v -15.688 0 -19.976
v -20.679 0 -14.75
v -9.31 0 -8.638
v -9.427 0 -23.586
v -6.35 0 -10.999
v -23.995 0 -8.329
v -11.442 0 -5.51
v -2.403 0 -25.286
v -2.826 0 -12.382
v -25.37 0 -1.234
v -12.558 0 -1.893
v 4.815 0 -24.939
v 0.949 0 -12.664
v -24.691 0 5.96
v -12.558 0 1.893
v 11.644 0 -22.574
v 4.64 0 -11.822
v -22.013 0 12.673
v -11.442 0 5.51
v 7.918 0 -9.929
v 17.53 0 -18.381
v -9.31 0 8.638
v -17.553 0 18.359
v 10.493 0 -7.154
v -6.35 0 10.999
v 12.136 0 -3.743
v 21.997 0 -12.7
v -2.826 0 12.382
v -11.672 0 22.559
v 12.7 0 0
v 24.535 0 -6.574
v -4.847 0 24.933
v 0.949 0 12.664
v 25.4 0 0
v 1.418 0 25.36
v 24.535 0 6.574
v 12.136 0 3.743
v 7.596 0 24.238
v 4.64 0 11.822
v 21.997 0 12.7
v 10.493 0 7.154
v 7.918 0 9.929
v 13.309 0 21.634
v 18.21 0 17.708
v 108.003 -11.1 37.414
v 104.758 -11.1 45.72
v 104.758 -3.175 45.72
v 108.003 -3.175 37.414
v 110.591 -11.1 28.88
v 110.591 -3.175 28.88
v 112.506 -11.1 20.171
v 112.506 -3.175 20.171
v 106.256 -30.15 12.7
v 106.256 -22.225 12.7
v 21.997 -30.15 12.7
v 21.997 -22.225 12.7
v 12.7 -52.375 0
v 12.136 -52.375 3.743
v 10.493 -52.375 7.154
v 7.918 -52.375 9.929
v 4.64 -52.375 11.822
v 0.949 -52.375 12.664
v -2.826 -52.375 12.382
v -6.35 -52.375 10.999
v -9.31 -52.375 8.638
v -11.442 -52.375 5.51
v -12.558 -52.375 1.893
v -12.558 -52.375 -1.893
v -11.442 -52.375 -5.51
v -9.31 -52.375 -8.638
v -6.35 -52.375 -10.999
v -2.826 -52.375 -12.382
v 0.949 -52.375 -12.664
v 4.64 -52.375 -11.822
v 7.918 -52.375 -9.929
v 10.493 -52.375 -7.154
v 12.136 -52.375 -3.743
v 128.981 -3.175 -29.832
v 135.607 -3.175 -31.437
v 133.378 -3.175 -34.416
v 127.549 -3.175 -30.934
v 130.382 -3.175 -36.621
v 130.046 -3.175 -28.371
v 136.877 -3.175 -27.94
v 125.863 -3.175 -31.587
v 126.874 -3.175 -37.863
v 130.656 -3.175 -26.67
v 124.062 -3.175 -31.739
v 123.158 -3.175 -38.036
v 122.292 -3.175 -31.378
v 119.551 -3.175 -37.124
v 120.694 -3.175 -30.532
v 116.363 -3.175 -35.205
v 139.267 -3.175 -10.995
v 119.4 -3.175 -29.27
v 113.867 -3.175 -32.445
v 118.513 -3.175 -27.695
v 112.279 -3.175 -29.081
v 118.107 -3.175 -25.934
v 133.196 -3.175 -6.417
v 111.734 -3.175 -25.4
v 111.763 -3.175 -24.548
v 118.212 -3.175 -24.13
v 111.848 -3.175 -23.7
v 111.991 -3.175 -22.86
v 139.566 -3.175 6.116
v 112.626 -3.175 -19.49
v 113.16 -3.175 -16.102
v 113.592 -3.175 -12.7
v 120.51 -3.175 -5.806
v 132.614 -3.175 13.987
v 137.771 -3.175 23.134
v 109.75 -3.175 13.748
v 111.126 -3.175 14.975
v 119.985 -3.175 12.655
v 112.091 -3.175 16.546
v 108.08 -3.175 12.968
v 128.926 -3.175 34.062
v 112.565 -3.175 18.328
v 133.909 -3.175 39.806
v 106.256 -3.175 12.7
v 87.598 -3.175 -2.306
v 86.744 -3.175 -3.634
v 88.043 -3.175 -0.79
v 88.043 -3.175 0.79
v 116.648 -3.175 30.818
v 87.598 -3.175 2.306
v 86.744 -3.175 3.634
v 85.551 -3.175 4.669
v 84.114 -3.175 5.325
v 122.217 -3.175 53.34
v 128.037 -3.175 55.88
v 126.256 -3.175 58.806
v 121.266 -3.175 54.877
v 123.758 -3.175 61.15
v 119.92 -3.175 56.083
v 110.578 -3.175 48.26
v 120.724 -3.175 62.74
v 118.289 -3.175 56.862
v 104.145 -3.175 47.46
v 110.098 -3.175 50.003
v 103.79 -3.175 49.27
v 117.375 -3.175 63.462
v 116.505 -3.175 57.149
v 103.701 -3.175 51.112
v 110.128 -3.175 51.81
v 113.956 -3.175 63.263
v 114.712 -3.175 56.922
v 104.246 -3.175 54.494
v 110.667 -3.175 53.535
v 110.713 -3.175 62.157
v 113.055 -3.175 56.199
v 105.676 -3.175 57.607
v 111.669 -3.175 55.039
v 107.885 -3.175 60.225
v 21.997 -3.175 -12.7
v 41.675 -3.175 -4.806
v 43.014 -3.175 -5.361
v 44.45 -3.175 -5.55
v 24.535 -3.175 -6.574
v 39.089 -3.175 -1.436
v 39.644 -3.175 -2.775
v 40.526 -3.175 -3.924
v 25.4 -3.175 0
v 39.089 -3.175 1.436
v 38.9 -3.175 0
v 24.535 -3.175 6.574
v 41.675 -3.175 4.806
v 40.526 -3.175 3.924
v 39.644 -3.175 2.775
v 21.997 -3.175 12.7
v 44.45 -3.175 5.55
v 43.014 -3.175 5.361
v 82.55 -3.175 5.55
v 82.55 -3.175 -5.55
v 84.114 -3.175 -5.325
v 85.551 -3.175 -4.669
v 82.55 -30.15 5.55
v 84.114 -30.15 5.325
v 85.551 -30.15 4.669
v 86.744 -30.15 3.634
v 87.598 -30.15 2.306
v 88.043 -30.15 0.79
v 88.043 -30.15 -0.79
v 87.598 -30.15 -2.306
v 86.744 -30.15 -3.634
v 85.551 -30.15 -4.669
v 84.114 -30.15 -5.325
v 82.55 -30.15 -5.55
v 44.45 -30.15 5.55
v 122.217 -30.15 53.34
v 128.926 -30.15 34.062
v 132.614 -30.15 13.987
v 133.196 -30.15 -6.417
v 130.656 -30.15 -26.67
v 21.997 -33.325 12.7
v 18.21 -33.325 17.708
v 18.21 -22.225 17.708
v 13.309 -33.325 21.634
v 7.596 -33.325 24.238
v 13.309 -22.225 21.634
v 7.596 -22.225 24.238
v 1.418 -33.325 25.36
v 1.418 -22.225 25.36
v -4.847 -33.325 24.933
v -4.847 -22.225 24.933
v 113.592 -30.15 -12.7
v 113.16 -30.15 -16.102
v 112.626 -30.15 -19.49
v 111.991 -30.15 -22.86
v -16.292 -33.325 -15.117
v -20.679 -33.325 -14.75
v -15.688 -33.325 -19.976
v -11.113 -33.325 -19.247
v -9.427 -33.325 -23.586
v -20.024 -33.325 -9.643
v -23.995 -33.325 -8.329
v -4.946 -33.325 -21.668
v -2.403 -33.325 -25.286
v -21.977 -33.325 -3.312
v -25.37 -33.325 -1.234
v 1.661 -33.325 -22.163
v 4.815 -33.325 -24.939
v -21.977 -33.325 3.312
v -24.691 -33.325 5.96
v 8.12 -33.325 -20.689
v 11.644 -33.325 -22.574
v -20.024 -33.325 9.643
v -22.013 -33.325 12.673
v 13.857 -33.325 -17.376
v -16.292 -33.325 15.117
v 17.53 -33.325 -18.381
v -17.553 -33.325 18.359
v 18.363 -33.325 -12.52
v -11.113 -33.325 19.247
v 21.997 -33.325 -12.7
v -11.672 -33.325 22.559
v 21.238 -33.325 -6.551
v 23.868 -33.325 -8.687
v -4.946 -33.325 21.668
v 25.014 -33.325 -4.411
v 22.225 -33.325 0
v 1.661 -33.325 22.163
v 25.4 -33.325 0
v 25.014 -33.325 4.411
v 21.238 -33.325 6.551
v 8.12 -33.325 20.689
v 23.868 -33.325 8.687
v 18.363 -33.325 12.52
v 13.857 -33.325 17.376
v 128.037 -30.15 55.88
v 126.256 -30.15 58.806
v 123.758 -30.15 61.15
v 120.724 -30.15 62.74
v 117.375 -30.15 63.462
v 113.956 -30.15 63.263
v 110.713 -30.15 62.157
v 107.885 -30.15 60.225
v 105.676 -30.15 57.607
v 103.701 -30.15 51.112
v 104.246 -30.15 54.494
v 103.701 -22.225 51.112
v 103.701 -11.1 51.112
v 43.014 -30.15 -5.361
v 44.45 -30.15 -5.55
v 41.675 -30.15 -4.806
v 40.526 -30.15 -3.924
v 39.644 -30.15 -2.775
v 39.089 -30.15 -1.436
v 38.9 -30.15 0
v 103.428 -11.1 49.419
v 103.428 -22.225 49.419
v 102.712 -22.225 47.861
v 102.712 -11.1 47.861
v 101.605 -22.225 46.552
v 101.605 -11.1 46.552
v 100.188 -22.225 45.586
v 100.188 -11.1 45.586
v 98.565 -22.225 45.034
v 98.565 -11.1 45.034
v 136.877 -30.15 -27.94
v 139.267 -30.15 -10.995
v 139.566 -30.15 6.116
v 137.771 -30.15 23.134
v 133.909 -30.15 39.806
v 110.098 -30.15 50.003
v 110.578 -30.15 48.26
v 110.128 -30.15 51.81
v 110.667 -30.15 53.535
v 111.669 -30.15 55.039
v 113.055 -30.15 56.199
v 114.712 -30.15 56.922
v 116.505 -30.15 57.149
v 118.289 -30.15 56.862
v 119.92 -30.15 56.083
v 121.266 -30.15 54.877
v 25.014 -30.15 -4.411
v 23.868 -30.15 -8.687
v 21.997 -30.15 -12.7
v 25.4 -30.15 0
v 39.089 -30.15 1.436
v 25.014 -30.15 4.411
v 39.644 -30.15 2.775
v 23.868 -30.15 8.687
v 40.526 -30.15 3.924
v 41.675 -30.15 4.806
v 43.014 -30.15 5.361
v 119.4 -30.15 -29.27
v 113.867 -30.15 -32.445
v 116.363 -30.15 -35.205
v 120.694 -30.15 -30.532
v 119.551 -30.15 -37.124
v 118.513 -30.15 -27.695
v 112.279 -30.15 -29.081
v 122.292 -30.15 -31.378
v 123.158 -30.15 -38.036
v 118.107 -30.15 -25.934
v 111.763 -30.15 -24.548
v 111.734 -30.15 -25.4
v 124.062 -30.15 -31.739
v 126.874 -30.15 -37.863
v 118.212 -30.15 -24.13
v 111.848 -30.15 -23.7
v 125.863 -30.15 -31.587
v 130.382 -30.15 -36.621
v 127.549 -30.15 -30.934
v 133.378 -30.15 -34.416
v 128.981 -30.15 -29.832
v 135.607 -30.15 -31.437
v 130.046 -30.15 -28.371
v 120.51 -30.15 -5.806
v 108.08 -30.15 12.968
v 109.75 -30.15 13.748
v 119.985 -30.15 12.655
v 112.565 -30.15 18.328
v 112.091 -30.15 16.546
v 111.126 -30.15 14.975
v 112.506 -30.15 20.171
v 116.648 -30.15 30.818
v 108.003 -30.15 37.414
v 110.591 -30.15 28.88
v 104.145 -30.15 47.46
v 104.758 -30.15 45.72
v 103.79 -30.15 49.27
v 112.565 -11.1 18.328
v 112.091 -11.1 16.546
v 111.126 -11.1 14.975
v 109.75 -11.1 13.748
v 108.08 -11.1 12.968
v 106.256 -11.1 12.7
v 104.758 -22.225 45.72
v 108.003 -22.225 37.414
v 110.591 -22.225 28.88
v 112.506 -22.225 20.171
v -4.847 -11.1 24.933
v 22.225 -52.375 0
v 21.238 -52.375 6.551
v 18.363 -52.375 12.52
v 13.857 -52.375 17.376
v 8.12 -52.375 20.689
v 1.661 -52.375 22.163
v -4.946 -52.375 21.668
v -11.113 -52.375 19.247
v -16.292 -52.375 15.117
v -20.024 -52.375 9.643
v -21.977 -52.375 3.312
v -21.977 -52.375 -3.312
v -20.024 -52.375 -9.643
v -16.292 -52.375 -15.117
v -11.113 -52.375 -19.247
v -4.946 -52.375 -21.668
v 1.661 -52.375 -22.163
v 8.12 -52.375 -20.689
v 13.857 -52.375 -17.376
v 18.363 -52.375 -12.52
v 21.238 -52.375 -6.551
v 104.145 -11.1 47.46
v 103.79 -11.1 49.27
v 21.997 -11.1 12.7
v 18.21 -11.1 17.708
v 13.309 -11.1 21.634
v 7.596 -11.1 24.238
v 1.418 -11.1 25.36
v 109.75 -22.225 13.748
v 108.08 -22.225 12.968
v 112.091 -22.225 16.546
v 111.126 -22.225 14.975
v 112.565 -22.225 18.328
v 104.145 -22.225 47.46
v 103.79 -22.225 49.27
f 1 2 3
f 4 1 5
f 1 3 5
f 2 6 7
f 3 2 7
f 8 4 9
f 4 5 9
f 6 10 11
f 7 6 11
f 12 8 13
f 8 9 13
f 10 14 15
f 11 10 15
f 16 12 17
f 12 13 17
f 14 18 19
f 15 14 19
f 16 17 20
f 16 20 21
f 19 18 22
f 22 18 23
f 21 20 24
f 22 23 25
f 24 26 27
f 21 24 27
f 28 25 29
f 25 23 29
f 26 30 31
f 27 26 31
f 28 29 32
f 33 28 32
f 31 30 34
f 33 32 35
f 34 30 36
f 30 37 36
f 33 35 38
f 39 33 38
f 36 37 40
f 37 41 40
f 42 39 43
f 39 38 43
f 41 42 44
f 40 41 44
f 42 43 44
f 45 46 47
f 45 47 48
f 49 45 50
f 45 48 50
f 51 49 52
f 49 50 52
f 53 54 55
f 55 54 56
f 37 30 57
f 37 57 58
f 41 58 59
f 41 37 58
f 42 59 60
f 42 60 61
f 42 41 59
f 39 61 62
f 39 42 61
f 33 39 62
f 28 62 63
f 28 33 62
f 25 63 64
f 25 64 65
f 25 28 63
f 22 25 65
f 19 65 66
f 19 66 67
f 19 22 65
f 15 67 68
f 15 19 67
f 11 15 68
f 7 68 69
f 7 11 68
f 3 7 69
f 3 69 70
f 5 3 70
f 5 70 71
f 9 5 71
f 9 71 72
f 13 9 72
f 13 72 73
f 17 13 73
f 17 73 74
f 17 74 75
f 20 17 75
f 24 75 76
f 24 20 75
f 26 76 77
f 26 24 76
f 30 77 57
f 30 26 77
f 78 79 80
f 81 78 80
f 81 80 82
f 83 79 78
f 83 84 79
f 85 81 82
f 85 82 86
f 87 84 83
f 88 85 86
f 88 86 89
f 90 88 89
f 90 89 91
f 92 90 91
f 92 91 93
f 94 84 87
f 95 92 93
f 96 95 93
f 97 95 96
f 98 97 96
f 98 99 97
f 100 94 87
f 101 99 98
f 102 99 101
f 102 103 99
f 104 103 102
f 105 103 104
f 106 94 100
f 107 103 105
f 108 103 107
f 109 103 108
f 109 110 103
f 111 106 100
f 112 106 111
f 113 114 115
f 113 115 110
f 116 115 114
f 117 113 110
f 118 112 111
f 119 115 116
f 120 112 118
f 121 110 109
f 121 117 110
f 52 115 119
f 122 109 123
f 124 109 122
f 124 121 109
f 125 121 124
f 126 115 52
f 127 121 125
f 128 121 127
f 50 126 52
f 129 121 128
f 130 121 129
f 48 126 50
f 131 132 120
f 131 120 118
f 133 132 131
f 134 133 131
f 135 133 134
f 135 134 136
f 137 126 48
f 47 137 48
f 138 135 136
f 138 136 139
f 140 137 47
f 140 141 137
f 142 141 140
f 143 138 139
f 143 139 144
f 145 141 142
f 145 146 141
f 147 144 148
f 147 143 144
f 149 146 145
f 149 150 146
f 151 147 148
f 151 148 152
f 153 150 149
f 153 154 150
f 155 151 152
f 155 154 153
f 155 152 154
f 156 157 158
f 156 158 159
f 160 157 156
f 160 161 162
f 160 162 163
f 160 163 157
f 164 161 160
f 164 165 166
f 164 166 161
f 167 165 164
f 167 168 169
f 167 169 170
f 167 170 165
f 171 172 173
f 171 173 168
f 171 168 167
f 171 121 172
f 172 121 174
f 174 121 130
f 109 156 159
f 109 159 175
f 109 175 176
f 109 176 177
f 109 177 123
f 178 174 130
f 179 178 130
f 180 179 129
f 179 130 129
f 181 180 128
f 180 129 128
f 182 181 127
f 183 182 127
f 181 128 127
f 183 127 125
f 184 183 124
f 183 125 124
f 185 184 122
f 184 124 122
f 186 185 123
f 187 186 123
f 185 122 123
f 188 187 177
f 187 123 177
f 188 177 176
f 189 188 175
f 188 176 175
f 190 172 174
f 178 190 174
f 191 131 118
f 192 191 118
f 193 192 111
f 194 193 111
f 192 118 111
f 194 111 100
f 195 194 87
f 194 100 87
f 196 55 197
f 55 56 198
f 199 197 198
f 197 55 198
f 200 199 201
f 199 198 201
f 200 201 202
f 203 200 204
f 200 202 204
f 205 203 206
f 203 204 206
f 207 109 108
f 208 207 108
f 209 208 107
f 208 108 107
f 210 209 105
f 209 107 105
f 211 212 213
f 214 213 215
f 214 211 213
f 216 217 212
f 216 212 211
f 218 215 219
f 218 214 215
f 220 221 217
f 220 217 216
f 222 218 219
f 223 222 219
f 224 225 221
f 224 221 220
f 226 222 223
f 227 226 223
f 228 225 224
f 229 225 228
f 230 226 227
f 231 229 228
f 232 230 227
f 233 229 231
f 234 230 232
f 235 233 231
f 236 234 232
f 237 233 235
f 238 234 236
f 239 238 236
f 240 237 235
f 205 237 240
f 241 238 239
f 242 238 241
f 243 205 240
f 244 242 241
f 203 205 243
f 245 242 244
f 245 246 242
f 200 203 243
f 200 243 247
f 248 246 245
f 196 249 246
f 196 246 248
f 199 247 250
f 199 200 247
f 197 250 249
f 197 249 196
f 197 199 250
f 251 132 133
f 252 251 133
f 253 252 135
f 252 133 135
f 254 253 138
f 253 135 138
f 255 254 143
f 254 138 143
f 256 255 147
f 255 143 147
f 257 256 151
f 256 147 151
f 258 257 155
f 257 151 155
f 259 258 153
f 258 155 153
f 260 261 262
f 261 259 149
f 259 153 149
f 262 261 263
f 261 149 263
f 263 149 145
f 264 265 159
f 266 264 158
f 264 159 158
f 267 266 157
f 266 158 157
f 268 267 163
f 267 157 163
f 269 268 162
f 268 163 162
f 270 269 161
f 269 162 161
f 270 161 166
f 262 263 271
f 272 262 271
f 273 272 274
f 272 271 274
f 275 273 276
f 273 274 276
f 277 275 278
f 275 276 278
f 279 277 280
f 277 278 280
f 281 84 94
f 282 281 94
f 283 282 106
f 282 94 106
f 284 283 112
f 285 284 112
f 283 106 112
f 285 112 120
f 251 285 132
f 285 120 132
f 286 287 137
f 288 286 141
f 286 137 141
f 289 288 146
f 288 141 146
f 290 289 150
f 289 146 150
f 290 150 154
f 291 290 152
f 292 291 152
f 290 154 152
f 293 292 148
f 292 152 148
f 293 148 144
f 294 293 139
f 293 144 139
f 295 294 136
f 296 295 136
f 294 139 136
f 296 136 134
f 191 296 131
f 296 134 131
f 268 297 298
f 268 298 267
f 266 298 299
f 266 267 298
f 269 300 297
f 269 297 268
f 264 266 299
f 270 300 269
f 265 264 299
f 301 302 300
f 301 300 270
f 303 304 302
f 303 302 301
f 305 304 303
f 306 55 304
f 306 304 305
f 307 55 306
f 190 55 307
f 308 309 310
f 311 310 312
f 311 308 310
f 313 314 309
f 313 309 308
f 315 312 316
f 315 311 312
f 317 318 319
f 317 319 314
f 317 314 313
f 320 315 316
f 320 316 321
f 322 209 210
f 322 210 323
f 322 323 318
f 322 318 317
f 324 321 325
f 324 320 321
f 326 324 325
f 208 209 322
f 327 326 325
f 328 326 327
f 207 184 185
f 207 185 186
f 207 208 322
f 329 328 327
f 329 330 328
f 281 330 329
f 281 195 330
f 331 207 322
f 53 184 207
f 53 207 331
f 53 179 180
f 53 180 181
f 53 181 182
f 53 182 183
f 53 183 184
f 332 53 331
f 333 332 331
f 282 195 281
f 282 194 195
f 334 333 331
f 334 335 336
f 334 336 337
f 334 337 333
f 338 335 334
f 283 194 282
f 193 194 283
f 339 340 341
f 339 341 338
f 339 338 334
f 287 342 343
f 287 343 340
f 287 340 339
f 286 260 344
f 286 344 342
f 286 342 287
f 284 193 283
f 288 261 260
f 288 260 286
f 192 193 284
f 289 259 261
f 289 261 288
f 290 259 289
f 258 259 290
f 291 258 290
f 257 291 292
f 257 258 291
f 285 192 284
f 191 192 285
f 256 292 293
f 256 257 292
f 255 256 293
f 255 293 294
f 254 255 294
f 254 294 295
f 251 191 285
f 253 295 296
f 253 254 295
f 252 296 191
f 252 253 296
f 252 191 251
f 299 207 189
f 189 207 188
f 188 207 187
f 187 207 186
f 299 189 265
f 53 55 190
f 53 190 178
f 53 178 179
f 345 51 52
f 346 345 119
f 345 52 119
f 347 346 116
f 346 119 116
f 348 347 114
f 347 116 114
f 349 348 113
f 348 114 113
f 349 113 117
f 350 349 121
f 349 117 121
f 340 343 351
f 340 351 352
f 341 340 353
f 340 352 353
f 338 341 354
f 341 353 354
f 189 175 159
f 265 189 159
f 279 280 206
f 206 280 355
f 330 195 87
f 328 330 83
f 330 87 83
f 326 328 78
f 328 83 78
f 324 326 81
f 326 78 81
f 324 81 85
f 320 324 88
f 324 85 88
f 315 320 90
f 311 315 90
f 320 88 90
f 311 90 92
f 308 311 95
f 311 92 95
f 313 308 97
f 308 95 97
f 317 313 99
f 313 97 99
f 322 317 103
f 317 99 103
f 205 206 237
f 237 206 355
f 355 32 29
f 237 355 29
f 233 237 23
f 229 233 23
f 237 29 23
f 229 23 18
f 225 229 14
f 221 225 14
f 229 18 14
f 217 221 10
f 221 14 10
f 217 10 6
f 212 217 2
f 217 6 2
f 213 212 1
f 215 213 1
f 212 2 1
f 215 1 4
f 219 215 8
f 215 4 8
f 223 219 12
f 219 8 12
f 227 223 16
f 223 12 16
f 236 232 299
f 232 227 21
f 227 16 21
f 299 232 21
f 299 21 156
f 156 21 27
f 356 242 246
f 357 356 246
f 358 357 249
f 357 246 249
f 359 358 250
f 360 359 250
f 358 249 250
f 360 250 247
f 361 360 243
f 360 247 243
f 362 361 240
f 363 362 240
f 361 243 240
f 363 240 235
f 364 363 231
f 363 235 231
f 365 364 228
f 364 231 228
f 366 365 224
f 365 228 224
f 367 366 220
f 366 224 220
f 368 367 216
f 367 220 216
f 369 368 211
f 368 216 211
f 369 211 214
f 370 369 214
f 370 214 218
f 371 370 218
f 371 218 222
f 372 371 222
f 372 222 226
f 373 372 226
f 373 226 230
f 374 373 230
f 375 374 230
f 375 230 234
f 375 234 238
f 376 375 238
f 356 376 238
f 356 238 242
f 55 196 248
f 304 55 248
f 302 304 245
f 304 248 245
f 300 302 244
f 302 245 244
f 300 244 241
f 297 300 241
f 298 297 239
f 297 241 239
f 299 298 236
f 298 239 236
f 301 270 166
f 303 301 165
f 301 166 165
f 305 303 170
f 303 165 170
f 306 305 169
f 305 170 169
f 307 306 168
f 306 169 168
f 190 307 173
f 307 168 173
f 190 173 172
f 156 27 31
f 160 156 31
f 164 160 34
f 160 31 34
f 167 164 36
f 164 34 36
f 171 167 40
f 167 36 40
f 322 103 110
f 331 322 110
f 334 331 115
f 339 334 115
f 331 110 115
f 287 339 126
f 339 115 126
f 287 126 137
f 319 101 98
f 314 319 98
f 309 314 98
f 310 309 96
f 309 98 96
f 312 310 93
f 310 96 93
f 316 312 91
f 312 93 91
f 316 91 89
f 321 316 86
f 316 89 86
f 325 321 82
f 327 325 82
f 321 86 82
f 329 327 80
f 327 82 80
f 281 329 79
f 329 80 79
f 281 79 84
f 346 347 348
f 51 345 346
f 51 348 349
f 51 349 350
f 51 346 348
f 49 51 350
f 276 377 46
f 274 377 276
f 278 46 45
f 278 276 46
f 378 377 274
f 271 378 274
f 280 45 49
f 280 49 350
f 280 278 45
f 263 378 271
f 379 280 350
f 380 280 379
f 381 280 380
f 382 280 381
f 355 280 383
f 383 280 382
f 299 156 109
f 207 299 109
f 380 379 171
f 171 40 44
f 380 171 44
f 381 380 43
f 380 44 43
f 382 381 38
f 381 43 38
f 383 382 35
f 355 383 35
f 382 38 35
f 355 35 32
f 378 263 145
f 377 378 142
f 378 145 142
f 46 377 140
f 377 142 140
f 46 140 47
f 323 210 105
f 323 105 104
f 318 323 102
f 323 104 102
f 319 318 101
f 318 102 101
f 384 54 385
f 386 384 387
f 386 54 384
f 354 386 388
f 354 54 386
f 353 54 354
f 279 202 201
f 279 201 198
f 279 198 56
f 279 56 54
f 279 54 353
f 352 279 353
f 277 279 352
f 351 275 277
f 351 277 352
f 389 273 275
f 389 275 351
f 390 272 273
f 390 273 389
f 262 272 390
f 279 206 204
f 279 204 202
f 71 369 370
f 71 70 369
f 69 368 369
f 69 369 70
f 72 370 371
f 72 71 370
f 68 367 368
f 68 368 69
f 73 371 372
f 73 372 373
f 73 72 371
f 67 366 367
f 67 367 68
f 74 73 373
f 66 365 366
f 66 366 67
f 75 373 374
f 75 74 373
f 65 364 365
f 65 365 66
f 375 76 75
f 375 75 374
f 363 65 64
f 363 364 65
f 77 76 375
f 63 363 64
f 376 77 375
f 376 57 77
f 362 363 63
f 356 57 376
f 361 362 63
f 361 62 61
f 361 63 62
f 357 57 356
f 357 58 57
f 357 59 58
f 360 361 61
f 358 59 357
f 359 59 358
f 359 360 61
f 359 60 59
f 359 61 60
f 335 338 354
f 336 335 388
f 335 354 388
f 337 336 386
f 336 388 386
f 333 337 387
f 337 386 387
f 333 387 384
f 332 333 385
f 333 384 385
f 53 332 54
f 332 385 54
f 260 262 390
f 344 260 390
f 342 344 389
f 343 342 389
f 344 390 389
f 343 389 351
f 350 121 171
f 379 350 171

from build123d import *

# Parameters (mm, degrees)
F0_R     = 22.225
F1_DEPTH = 33.3248
F0_R_2   = 12.7
F2_DEPTH = 52.3748
F4_DEPTH = 3.175
F6_DEPTH = 3.175
F7_DEPTH = 22.225
F9_DEPTH = 11.0998


with BuildPart() as f1:
    # F0 (on Front) → F1 (new body)
    with BuildSketch(Plane.XZ):
        with BuildLine():
            ThreePointArc((21.9970452561, -12.7), (24.5345159877, -6.5740037456), (25.4, 0))
            ThreePointArc((25.4, 0), (24.5345159877, 6.5740037456), (21.9970452561, 12.7))
            ThreePointArc((21.9970452561, 12.7), (10.5332083635, 23.1130162803), (-4.8465484826, 24.9333304596))
            ThreePointArc((-4.8465484826, 24.9333304596), (-20.6785341663, -14.7498550751), (21.9970452561, -12.7))
        make_face()
        Circle(F0_R, mode=Mode.SUBTRACT)
        with BuildLine():
            ThreePointArc((21.9970452561, 12.7), (24.5345159877, 6.5740037456), (25.4, 0))
            ThreePointArc((25.4, 0), (24.5345159877, -6.5740037456), (21.9970452561, -12.7))
            Line((21.9970452561, -12.7), (44.45, -12.7))
            Line((44.45, -12.7), (113.592253257, -12.7))
            ThreePointArc((113.592253257, -12.7), (114.2376587708, 3.7745620369), (112.506165921, 20.1705882353))
            ThreePointArc((112.506165921, 20.1705882353), (111.126051049, 14.9752751807), (106.2558233698, 12.7))
            Line((106.2558233698, 12.7), (44.45, 12.7))
            Line((44.45, 12.7), (21.9970452561, 12.7))
        make_face()
        with BuildLine():
            ThreePointArc((44.45, -5.5499), (40.5256280751, -3.9243719249), (38.9001, 0))
            ThreePointArc((38.9001, 0), (40.5256280751, 3.9243719249), (44.45, 5.5499))
            Line((44.45, 5.5499), (82.55, 5.5499))
            ThreePointArc((82.55, 5.5499), (88.0999, 0), (82.55, -5.5499))
            Line((82.55, -5.5499), (44.45, -5.5499))
        make_face(mode=Mode.SUBTRACT)
        with BuildLine():
            ThreePointArc((112.506165921, 20.1705882353), (114.2376587708, 3.7745620369), (113.592253257, -12.7))
            ThreePointArc((113.592253257, -12.7), (112.9058029226, -17.7980242274), (111.99067104, -22.86))
            ThreePointArc((111.99067104, -22.86), (111.7983897902, -24.1235361825), (111.7340789334, -25.4))
            ThreePointArc((111.7340789334, -25.4), (123.1576151159, -38.0356891432), (136.8774868267, -27.94))
            ThreePointArc((136.8774868267, -27.94), (138.9294471202, 14.6526012321), (128.0371649171, 55.88))
            ThreePointArc((128.0371649171, 55.88), (113.9555393972, 63.2630335862), (103.7012522936, 51.1118625227))
            ThreePointArc((103.7012522936, 51.1118625227), (103.9343890657, 48.3581167453), (104.7576803867, 45.72))
            ThreePointArc((104.7576803867, 45.72), (109.380472839, 33.1723101625), (112.506165921, 20.1705882353))
        make_face()
        with BuildLine():
            ThreePointArc((130.6557828801, -26.67), (123.1640789334, -31.6217039467), (118.2123749867, -24.13))
            ThreePointArc((118.2123749867, -24.13), (119.9845225129, 12.6545192459), (110.5775515193, 48.26))
            ThreePointArc((110.5775515193, 48.26), (113.8574226519, 56.6198711326), (122.2172937845, 53.34))
            ThreePointArc((122.2172937845, 53.34), (132.6144722511, 13.9865739034), (130.6557828801, -26.67))
        make_face(mode=Mode.SUBTRACT)
    extrude(amount=F1_DEPTH)

    # F0 (on Front) → F2 (join)
    with BuildSketch(Plane.XZ):
        Circle(F0_R)
        Circle(F0_R_2, mode=Mode.SUBTRACT)
    extrude(amount=F2_DEPTH)

    # F3 (on face) → F4 (cut)
    with BuildSketch(Plane.XZ.offset(33.3248)):
        with BuildLine():
            ThreePointArc((21.9970452561, 12.7), (24.5345159877, 6.5740037456), (25.4, 0))
            ThreePointArc((25.4, 0), (24.5345159877, -6.5740037456), (21.9970452561, -12.7))
            Line((21.9970452561, -12.7), (113.592253257, -12.7))
            ThreePointArc((113.592253257, -12.7), (112.9058029226, -17.7980242274), (111.99067104, -22.86))
            ThreePointArc((111.99067104, -22.86), (121.8940789334, -37.8434078933), (136.8774868267, -27.94))
            ThreePointArc((136.8774868267, -27.94), (138.9294471202, 14.6526012321), (128.0371649171, 55.88))
            ThreePointArc((128.0371649171, 55.88), (111.3174226519, 62.4397422652), (104.7576803867, 45.72))
            ThreePointArc((104.7576803867, 45.72), (109.380472839, 33.1723101625), (112.506165921, 20.1705882353))
            ThreePointArc((112.506165921, 20.1705882353), (111.126051049, 14.9752751807), (106.2558233698, 12.7))
            Line((106.2558233698, 12.7), (21.9970452561, 12.7))
        make_face()
        with BuildLine():
            Line((82.55, -5.5499), (44.45, -5.5499))
            ThreePointArc((44.45, -5.5499), (38.9001, 0), (44.45, 5.5499))
            Line((44.45, 5.5499), (82.55, 5.5499))
            ThreePointArc((82.55, 5.5499), (88.0999, 0), (82.55, -5.5499))
        make_face(mode=Mode.SUBTRACT)
        with BuildLine():
            ThreePointArc((130.6557828801, -26.67), (123.1640789334, -31.6217039467), (118.2123749867, -24.13))
            ThreePointArc((118.2123749867, -24.13), (119.9845225129, 12.6545192459), (110.5775515193, 48.26))
            ThreePointArc((110.5775515193, 48.26), (113.8574226519, 56.6198711326), (122.2172937845, 53.34))
            ThreePointArc((122.2172937845, 53.34), (132.6144722511, 13.9865739034), (130.6557828801, -26.67))
        make_face(mode=Mode.SUBTRACT)
    extrude(amount=-F4_DEPTH, mode=Mode.SUBTRACT)

    # F5 (on face) → F6 (cut)
    with BuildSketch(Plane(origin=(0, 0, 0), x_dir=(-1, 0, 0), z_dir=(0, 1, 0))):
        with BuildLine():
            ThreePointArc((-21.9970452561, -12.7), (-25.4, 0), (-21.9970452561, 12.7))
            Line((-21.9970452561, 12.7), (-106.2558233698, 12.7))
            ThreePointArc((-106.2558233698, 12.7), (-111.126051049, 14.9752751807), (-112.506165921, 20.1705882353))
            ThreePointArc((-112.506165921, 20.1705882353), (-109.380472839, 33.1723101625), (-104.7576803867, 45.72))
            ThreePointArc((-104.7576803867, 45.72), (-111.3174226519, 62.4397422652), (-128.0371649171, 55.88))
            ThreePointArc((-128.0371649171, 55.88), (-138.9294471202, 14.6526012321), (-136.8774868267, -27.94))
            ThreePointArc((-136.8774868267, -27.94), (-121.8940789334, -37.8434078933), (-111.99067104, -22.86))
            ThreePointArc((-111.99067104, -22.86), (-112.9058029226, -17.7980242274), (-113.592253257, -12.7))
            Line((-113.592253257, -12.7), (-21.9970452561, -12.7))
        make_face()
        with BuildLine():
            ThreePointArc((-122.2172937845, 53.34), (-113.8574226519, 56.6198711326), (-110.5775515193, 48.26))
            ThreePointArc((-110.5775515193, 48.26), (-119.9845225129, 12.6545192459), (-118.2123749867, -24.13))
            ThreePointArc((-118.2123749867, -24.13), (-123.1640789334, -31.6217039467), (-130.6557828801, -26.67))
            ThreePointArc((-130.6557828801, -26.67), (-132.6144722511, 13.9865739034), (-122.2172937845, 53.34))
        make_face(mode=Mode.SUBTRACT)
        with BuildLine():
            Line((-82.55, 5.5499), (-44.45, 5.5499))
            ThreePointArc((-44.45, 5.5499), (-38.9001, 0), (-44.45, -5.5499))
            Line((-44.45, -5.5499), (-82.55, -5.5499))
            ThreePointArc((-82.55, -5.5499), (-88.0999, 0), (-82.55, 5.5499))
        make_face(mode=Mode.SUBTRACT)
    extrude(amount=-F6_DEPTH, mode=Mode.SUBTRACT)

    # F0 (on Front) → F7 (join)
    with BuildSketch(Plane.XZ):
        with BuildLine():
            ThreePointArc((-4.8465484826, 24.9333304596), (10.5332083635, 23.1130162803), (21.9970452561, 12.7))
            Line((21.9970452561, 12.7), (44.45, 12.7))
            Line((44.45, 12.7), (106.2558233698, 12.7))
            ThreePointArc((106.2558233698, 12.7), (111.126051049, 14.9752751807), (112.506165921, 20.1705882353))
            ThreePointArc((112.506165921, 20.1705882353), (109.380472839, 33.1723101625), (104.7576803867, 45.72))
            ThreePointArc((104.7576803867, 45.72), (103.9343890657, 48.3581167453), (103.7012522936, 51.1118625227))
            ThreePointArc((103.7012522936, 51.1118625227), (102.2030178457, 47.1688368577), (98.5648042351, 45.0344611692))
            Line((98.5648042351, 45.0344611692), (-4.8465484826, 24.9333304596))
        make_face()
    extrude(amount=F7_DEPTH)

    # F8 (on face) → F9 (cut)
    with BuildSketch(Plane(origin=(0, 0, 0), x_dir=(-1, 0, 0), z_dir=(0, 1, 0))):
        with BuildLine():
            ThreePointArc((-21.9970452561, 12.7), (-10.5332083635, 23.1130162803), (4.8465484826, 24.9333304596))
            Line((4.8465484826, 24.9333304596), (-98.5648042351, 45.0344611692))
            ThreePointArc((-98.5648042351, 45.0344611692), (-102.2030178457, 47.1688368577), (-103.7012522936, 51.1118625227))
            ThreePointArc((-103.7012522936, 51.1118625227), (-103.9343890657, 48.3581167453), (-104.7576803867, 45.72))
            ThreePointArc((-104.7576803867, 45.72), (-109.380472839, 33.1723101625), (-112.506165921, 20.1705882353))
            ThreePointArc((-112.506165921, 20.1705882353), (-111.126051049, 14.9752751807), (-106.2558233698, 12.7))
            Line((-106.2558233698, 12.7), (-21.9970452561, 12.7))
        make_face()
    extrude(amount=-F9_DEPTH, mode=Mode.SUBTRACT)


solid = f1.part
